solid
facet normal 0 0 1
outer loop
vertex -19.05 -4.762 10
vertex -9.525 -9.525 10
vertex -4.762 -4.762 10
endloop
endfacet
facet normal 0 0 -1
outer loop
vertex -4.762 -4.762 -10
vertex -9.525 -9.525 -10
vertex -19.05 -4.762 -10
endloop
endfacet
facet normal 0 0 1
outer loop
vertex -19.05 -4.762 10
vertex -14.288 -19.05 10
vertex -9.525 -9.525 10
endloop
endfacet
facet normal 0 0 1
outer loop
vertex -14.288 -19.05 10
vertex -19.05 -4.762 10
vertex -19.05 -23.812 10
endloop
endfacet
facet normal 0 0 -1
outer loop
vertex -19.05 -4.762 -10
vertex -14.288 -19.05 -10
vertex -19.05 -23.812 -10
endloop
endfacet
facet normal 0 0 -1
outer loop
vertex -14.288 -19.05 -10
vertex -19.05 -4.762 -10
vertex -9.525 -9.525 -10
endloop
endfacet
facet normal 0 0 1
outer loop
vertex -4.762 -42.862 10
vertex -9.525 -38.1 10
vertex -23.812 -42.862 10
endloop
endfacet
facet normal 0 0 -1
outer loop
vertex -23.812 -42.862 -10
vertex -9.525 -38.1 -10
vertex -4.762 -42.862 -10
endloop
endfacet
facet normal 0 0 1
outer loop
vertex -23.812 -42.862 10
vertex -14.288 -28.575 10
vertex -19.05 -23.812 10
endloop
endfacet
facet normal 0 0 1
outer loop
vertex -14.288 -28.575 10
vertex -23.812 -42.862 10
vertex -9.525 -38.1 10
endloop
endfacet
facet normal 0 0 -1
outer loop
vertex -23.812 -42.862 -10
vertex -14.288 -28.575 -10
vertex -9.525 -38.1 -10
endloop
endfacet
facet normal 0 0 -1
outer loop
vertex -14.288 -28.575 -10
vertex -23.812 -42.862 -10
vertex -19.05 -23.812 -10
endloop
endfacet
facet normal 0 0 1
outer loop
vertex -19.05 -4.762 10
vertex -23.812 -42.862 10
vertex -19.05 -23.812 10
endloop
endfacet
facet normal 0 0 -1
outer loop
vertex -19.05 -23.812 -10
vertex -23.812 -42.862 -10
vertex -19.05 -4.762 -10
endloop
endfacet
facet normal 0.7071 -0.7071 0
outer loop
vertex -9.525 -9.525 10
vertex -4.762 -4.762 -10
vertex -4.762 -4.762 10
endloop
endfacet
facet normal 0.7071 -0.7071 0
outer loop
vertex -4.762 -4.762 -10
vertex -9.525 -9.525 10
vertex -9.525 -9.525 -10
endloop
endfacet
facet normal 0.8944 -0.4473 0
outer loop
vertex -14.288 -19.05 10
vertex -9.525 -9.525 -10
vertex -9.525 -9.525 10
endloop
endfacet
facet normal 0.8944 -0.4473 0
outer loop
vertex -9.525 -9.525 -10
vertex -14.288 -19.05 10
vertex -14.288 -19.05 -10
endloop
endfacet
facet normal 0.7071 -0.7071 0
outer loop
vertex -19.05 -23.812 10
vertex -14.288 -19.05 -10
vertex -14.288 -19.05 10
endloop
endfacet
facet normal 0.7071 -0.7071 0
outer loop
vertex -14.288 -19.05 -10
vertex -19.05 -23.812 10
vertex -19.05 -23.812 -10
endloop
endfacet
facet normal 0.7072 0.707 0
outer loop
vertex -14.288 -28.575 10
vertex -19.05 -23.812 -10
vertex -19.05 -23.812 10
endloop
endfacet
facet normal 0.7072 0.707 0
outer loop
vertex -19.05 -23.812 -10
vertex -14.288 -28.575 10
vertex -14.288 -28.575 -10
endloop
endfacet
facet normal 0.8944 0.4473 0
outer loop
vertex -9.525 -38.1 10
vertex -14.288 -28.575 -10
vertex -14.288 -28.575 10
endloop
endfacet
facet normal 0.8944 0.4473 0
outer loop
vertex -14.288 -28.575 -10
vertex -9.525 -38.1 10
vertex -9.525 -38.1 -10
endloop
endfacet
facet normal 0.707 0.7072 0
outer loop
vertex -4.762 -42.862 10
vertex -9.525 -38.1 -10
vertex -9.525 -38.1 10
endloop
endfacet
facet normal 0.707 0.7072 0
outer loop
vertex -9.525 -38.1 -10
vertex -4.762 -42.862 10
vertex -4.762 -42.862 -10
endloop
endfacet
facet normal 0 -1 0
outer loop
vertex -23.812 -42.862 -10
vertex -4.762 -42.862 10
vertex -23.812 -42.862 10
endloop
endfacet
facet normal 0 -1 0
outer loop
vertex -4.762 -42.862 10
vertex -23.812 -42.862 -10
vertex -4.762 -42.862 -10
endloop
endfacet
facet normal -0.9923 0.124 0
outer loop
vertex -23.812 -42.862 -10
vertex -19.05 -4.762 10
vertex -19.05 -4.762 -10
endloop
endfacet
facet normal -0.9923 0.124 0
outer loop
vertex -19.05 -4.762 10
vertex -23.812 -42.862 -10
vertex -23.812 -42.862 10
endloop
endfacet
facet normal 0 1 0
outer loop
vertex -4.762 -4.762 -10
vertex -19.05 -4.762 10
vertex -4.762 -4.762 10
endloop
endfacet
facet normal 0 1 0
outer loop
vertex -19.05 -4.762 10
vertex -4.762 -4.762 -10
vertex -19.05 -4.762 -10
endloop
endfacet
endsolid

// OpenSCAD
polyhedron(
    points=[
    [-4.7625, -4.7625, 10],
    [-9.525, -9.525, 10],
    [-14.2875, -19.05, 10],
    [-19.05, -23.8125, 10],
    [-14.2875, -28.575, 10],
    [-9.525, -38.1, 10],
    [-4.7625, -42.8625, 10],
    [-23.8125, -42.8625, 10],
    [-19.05, -4.7625, 10],
    [-4.7625, -4.7625, -10],
    [-9.525, -9.525, -10],
    [-14.2875, -19.05, -10],
    [-19.05, -23.8125, -10],
    [-14.2875, -28.575, -10],
    [-9.525, -38.1, -10],
    [-4.7625, -42.8625, -10],
    [-23.8125, -42.8625, -10],
    [-19.05, -4.7625, -10],
    ],
    faces=[
        [0,1,8],
        [17,10,9],
        [1,2,3,8],
        [17,12,11,10],
        [7,5,6],
        [15,14,16],
        [7,3,4,5],
        [14,13,12,16],
        [3,7,8],
        [17,16,12],
        [0,9,10,1],
        [1,10,11,2],
        [2,11,12,3],
        [3,12,13,4],
        [4,13,14,5],
        [5,14,15,6],
        [6,15,16,7],
        [7,16,17,8],
        [8,17,9,0],
    ]
);
